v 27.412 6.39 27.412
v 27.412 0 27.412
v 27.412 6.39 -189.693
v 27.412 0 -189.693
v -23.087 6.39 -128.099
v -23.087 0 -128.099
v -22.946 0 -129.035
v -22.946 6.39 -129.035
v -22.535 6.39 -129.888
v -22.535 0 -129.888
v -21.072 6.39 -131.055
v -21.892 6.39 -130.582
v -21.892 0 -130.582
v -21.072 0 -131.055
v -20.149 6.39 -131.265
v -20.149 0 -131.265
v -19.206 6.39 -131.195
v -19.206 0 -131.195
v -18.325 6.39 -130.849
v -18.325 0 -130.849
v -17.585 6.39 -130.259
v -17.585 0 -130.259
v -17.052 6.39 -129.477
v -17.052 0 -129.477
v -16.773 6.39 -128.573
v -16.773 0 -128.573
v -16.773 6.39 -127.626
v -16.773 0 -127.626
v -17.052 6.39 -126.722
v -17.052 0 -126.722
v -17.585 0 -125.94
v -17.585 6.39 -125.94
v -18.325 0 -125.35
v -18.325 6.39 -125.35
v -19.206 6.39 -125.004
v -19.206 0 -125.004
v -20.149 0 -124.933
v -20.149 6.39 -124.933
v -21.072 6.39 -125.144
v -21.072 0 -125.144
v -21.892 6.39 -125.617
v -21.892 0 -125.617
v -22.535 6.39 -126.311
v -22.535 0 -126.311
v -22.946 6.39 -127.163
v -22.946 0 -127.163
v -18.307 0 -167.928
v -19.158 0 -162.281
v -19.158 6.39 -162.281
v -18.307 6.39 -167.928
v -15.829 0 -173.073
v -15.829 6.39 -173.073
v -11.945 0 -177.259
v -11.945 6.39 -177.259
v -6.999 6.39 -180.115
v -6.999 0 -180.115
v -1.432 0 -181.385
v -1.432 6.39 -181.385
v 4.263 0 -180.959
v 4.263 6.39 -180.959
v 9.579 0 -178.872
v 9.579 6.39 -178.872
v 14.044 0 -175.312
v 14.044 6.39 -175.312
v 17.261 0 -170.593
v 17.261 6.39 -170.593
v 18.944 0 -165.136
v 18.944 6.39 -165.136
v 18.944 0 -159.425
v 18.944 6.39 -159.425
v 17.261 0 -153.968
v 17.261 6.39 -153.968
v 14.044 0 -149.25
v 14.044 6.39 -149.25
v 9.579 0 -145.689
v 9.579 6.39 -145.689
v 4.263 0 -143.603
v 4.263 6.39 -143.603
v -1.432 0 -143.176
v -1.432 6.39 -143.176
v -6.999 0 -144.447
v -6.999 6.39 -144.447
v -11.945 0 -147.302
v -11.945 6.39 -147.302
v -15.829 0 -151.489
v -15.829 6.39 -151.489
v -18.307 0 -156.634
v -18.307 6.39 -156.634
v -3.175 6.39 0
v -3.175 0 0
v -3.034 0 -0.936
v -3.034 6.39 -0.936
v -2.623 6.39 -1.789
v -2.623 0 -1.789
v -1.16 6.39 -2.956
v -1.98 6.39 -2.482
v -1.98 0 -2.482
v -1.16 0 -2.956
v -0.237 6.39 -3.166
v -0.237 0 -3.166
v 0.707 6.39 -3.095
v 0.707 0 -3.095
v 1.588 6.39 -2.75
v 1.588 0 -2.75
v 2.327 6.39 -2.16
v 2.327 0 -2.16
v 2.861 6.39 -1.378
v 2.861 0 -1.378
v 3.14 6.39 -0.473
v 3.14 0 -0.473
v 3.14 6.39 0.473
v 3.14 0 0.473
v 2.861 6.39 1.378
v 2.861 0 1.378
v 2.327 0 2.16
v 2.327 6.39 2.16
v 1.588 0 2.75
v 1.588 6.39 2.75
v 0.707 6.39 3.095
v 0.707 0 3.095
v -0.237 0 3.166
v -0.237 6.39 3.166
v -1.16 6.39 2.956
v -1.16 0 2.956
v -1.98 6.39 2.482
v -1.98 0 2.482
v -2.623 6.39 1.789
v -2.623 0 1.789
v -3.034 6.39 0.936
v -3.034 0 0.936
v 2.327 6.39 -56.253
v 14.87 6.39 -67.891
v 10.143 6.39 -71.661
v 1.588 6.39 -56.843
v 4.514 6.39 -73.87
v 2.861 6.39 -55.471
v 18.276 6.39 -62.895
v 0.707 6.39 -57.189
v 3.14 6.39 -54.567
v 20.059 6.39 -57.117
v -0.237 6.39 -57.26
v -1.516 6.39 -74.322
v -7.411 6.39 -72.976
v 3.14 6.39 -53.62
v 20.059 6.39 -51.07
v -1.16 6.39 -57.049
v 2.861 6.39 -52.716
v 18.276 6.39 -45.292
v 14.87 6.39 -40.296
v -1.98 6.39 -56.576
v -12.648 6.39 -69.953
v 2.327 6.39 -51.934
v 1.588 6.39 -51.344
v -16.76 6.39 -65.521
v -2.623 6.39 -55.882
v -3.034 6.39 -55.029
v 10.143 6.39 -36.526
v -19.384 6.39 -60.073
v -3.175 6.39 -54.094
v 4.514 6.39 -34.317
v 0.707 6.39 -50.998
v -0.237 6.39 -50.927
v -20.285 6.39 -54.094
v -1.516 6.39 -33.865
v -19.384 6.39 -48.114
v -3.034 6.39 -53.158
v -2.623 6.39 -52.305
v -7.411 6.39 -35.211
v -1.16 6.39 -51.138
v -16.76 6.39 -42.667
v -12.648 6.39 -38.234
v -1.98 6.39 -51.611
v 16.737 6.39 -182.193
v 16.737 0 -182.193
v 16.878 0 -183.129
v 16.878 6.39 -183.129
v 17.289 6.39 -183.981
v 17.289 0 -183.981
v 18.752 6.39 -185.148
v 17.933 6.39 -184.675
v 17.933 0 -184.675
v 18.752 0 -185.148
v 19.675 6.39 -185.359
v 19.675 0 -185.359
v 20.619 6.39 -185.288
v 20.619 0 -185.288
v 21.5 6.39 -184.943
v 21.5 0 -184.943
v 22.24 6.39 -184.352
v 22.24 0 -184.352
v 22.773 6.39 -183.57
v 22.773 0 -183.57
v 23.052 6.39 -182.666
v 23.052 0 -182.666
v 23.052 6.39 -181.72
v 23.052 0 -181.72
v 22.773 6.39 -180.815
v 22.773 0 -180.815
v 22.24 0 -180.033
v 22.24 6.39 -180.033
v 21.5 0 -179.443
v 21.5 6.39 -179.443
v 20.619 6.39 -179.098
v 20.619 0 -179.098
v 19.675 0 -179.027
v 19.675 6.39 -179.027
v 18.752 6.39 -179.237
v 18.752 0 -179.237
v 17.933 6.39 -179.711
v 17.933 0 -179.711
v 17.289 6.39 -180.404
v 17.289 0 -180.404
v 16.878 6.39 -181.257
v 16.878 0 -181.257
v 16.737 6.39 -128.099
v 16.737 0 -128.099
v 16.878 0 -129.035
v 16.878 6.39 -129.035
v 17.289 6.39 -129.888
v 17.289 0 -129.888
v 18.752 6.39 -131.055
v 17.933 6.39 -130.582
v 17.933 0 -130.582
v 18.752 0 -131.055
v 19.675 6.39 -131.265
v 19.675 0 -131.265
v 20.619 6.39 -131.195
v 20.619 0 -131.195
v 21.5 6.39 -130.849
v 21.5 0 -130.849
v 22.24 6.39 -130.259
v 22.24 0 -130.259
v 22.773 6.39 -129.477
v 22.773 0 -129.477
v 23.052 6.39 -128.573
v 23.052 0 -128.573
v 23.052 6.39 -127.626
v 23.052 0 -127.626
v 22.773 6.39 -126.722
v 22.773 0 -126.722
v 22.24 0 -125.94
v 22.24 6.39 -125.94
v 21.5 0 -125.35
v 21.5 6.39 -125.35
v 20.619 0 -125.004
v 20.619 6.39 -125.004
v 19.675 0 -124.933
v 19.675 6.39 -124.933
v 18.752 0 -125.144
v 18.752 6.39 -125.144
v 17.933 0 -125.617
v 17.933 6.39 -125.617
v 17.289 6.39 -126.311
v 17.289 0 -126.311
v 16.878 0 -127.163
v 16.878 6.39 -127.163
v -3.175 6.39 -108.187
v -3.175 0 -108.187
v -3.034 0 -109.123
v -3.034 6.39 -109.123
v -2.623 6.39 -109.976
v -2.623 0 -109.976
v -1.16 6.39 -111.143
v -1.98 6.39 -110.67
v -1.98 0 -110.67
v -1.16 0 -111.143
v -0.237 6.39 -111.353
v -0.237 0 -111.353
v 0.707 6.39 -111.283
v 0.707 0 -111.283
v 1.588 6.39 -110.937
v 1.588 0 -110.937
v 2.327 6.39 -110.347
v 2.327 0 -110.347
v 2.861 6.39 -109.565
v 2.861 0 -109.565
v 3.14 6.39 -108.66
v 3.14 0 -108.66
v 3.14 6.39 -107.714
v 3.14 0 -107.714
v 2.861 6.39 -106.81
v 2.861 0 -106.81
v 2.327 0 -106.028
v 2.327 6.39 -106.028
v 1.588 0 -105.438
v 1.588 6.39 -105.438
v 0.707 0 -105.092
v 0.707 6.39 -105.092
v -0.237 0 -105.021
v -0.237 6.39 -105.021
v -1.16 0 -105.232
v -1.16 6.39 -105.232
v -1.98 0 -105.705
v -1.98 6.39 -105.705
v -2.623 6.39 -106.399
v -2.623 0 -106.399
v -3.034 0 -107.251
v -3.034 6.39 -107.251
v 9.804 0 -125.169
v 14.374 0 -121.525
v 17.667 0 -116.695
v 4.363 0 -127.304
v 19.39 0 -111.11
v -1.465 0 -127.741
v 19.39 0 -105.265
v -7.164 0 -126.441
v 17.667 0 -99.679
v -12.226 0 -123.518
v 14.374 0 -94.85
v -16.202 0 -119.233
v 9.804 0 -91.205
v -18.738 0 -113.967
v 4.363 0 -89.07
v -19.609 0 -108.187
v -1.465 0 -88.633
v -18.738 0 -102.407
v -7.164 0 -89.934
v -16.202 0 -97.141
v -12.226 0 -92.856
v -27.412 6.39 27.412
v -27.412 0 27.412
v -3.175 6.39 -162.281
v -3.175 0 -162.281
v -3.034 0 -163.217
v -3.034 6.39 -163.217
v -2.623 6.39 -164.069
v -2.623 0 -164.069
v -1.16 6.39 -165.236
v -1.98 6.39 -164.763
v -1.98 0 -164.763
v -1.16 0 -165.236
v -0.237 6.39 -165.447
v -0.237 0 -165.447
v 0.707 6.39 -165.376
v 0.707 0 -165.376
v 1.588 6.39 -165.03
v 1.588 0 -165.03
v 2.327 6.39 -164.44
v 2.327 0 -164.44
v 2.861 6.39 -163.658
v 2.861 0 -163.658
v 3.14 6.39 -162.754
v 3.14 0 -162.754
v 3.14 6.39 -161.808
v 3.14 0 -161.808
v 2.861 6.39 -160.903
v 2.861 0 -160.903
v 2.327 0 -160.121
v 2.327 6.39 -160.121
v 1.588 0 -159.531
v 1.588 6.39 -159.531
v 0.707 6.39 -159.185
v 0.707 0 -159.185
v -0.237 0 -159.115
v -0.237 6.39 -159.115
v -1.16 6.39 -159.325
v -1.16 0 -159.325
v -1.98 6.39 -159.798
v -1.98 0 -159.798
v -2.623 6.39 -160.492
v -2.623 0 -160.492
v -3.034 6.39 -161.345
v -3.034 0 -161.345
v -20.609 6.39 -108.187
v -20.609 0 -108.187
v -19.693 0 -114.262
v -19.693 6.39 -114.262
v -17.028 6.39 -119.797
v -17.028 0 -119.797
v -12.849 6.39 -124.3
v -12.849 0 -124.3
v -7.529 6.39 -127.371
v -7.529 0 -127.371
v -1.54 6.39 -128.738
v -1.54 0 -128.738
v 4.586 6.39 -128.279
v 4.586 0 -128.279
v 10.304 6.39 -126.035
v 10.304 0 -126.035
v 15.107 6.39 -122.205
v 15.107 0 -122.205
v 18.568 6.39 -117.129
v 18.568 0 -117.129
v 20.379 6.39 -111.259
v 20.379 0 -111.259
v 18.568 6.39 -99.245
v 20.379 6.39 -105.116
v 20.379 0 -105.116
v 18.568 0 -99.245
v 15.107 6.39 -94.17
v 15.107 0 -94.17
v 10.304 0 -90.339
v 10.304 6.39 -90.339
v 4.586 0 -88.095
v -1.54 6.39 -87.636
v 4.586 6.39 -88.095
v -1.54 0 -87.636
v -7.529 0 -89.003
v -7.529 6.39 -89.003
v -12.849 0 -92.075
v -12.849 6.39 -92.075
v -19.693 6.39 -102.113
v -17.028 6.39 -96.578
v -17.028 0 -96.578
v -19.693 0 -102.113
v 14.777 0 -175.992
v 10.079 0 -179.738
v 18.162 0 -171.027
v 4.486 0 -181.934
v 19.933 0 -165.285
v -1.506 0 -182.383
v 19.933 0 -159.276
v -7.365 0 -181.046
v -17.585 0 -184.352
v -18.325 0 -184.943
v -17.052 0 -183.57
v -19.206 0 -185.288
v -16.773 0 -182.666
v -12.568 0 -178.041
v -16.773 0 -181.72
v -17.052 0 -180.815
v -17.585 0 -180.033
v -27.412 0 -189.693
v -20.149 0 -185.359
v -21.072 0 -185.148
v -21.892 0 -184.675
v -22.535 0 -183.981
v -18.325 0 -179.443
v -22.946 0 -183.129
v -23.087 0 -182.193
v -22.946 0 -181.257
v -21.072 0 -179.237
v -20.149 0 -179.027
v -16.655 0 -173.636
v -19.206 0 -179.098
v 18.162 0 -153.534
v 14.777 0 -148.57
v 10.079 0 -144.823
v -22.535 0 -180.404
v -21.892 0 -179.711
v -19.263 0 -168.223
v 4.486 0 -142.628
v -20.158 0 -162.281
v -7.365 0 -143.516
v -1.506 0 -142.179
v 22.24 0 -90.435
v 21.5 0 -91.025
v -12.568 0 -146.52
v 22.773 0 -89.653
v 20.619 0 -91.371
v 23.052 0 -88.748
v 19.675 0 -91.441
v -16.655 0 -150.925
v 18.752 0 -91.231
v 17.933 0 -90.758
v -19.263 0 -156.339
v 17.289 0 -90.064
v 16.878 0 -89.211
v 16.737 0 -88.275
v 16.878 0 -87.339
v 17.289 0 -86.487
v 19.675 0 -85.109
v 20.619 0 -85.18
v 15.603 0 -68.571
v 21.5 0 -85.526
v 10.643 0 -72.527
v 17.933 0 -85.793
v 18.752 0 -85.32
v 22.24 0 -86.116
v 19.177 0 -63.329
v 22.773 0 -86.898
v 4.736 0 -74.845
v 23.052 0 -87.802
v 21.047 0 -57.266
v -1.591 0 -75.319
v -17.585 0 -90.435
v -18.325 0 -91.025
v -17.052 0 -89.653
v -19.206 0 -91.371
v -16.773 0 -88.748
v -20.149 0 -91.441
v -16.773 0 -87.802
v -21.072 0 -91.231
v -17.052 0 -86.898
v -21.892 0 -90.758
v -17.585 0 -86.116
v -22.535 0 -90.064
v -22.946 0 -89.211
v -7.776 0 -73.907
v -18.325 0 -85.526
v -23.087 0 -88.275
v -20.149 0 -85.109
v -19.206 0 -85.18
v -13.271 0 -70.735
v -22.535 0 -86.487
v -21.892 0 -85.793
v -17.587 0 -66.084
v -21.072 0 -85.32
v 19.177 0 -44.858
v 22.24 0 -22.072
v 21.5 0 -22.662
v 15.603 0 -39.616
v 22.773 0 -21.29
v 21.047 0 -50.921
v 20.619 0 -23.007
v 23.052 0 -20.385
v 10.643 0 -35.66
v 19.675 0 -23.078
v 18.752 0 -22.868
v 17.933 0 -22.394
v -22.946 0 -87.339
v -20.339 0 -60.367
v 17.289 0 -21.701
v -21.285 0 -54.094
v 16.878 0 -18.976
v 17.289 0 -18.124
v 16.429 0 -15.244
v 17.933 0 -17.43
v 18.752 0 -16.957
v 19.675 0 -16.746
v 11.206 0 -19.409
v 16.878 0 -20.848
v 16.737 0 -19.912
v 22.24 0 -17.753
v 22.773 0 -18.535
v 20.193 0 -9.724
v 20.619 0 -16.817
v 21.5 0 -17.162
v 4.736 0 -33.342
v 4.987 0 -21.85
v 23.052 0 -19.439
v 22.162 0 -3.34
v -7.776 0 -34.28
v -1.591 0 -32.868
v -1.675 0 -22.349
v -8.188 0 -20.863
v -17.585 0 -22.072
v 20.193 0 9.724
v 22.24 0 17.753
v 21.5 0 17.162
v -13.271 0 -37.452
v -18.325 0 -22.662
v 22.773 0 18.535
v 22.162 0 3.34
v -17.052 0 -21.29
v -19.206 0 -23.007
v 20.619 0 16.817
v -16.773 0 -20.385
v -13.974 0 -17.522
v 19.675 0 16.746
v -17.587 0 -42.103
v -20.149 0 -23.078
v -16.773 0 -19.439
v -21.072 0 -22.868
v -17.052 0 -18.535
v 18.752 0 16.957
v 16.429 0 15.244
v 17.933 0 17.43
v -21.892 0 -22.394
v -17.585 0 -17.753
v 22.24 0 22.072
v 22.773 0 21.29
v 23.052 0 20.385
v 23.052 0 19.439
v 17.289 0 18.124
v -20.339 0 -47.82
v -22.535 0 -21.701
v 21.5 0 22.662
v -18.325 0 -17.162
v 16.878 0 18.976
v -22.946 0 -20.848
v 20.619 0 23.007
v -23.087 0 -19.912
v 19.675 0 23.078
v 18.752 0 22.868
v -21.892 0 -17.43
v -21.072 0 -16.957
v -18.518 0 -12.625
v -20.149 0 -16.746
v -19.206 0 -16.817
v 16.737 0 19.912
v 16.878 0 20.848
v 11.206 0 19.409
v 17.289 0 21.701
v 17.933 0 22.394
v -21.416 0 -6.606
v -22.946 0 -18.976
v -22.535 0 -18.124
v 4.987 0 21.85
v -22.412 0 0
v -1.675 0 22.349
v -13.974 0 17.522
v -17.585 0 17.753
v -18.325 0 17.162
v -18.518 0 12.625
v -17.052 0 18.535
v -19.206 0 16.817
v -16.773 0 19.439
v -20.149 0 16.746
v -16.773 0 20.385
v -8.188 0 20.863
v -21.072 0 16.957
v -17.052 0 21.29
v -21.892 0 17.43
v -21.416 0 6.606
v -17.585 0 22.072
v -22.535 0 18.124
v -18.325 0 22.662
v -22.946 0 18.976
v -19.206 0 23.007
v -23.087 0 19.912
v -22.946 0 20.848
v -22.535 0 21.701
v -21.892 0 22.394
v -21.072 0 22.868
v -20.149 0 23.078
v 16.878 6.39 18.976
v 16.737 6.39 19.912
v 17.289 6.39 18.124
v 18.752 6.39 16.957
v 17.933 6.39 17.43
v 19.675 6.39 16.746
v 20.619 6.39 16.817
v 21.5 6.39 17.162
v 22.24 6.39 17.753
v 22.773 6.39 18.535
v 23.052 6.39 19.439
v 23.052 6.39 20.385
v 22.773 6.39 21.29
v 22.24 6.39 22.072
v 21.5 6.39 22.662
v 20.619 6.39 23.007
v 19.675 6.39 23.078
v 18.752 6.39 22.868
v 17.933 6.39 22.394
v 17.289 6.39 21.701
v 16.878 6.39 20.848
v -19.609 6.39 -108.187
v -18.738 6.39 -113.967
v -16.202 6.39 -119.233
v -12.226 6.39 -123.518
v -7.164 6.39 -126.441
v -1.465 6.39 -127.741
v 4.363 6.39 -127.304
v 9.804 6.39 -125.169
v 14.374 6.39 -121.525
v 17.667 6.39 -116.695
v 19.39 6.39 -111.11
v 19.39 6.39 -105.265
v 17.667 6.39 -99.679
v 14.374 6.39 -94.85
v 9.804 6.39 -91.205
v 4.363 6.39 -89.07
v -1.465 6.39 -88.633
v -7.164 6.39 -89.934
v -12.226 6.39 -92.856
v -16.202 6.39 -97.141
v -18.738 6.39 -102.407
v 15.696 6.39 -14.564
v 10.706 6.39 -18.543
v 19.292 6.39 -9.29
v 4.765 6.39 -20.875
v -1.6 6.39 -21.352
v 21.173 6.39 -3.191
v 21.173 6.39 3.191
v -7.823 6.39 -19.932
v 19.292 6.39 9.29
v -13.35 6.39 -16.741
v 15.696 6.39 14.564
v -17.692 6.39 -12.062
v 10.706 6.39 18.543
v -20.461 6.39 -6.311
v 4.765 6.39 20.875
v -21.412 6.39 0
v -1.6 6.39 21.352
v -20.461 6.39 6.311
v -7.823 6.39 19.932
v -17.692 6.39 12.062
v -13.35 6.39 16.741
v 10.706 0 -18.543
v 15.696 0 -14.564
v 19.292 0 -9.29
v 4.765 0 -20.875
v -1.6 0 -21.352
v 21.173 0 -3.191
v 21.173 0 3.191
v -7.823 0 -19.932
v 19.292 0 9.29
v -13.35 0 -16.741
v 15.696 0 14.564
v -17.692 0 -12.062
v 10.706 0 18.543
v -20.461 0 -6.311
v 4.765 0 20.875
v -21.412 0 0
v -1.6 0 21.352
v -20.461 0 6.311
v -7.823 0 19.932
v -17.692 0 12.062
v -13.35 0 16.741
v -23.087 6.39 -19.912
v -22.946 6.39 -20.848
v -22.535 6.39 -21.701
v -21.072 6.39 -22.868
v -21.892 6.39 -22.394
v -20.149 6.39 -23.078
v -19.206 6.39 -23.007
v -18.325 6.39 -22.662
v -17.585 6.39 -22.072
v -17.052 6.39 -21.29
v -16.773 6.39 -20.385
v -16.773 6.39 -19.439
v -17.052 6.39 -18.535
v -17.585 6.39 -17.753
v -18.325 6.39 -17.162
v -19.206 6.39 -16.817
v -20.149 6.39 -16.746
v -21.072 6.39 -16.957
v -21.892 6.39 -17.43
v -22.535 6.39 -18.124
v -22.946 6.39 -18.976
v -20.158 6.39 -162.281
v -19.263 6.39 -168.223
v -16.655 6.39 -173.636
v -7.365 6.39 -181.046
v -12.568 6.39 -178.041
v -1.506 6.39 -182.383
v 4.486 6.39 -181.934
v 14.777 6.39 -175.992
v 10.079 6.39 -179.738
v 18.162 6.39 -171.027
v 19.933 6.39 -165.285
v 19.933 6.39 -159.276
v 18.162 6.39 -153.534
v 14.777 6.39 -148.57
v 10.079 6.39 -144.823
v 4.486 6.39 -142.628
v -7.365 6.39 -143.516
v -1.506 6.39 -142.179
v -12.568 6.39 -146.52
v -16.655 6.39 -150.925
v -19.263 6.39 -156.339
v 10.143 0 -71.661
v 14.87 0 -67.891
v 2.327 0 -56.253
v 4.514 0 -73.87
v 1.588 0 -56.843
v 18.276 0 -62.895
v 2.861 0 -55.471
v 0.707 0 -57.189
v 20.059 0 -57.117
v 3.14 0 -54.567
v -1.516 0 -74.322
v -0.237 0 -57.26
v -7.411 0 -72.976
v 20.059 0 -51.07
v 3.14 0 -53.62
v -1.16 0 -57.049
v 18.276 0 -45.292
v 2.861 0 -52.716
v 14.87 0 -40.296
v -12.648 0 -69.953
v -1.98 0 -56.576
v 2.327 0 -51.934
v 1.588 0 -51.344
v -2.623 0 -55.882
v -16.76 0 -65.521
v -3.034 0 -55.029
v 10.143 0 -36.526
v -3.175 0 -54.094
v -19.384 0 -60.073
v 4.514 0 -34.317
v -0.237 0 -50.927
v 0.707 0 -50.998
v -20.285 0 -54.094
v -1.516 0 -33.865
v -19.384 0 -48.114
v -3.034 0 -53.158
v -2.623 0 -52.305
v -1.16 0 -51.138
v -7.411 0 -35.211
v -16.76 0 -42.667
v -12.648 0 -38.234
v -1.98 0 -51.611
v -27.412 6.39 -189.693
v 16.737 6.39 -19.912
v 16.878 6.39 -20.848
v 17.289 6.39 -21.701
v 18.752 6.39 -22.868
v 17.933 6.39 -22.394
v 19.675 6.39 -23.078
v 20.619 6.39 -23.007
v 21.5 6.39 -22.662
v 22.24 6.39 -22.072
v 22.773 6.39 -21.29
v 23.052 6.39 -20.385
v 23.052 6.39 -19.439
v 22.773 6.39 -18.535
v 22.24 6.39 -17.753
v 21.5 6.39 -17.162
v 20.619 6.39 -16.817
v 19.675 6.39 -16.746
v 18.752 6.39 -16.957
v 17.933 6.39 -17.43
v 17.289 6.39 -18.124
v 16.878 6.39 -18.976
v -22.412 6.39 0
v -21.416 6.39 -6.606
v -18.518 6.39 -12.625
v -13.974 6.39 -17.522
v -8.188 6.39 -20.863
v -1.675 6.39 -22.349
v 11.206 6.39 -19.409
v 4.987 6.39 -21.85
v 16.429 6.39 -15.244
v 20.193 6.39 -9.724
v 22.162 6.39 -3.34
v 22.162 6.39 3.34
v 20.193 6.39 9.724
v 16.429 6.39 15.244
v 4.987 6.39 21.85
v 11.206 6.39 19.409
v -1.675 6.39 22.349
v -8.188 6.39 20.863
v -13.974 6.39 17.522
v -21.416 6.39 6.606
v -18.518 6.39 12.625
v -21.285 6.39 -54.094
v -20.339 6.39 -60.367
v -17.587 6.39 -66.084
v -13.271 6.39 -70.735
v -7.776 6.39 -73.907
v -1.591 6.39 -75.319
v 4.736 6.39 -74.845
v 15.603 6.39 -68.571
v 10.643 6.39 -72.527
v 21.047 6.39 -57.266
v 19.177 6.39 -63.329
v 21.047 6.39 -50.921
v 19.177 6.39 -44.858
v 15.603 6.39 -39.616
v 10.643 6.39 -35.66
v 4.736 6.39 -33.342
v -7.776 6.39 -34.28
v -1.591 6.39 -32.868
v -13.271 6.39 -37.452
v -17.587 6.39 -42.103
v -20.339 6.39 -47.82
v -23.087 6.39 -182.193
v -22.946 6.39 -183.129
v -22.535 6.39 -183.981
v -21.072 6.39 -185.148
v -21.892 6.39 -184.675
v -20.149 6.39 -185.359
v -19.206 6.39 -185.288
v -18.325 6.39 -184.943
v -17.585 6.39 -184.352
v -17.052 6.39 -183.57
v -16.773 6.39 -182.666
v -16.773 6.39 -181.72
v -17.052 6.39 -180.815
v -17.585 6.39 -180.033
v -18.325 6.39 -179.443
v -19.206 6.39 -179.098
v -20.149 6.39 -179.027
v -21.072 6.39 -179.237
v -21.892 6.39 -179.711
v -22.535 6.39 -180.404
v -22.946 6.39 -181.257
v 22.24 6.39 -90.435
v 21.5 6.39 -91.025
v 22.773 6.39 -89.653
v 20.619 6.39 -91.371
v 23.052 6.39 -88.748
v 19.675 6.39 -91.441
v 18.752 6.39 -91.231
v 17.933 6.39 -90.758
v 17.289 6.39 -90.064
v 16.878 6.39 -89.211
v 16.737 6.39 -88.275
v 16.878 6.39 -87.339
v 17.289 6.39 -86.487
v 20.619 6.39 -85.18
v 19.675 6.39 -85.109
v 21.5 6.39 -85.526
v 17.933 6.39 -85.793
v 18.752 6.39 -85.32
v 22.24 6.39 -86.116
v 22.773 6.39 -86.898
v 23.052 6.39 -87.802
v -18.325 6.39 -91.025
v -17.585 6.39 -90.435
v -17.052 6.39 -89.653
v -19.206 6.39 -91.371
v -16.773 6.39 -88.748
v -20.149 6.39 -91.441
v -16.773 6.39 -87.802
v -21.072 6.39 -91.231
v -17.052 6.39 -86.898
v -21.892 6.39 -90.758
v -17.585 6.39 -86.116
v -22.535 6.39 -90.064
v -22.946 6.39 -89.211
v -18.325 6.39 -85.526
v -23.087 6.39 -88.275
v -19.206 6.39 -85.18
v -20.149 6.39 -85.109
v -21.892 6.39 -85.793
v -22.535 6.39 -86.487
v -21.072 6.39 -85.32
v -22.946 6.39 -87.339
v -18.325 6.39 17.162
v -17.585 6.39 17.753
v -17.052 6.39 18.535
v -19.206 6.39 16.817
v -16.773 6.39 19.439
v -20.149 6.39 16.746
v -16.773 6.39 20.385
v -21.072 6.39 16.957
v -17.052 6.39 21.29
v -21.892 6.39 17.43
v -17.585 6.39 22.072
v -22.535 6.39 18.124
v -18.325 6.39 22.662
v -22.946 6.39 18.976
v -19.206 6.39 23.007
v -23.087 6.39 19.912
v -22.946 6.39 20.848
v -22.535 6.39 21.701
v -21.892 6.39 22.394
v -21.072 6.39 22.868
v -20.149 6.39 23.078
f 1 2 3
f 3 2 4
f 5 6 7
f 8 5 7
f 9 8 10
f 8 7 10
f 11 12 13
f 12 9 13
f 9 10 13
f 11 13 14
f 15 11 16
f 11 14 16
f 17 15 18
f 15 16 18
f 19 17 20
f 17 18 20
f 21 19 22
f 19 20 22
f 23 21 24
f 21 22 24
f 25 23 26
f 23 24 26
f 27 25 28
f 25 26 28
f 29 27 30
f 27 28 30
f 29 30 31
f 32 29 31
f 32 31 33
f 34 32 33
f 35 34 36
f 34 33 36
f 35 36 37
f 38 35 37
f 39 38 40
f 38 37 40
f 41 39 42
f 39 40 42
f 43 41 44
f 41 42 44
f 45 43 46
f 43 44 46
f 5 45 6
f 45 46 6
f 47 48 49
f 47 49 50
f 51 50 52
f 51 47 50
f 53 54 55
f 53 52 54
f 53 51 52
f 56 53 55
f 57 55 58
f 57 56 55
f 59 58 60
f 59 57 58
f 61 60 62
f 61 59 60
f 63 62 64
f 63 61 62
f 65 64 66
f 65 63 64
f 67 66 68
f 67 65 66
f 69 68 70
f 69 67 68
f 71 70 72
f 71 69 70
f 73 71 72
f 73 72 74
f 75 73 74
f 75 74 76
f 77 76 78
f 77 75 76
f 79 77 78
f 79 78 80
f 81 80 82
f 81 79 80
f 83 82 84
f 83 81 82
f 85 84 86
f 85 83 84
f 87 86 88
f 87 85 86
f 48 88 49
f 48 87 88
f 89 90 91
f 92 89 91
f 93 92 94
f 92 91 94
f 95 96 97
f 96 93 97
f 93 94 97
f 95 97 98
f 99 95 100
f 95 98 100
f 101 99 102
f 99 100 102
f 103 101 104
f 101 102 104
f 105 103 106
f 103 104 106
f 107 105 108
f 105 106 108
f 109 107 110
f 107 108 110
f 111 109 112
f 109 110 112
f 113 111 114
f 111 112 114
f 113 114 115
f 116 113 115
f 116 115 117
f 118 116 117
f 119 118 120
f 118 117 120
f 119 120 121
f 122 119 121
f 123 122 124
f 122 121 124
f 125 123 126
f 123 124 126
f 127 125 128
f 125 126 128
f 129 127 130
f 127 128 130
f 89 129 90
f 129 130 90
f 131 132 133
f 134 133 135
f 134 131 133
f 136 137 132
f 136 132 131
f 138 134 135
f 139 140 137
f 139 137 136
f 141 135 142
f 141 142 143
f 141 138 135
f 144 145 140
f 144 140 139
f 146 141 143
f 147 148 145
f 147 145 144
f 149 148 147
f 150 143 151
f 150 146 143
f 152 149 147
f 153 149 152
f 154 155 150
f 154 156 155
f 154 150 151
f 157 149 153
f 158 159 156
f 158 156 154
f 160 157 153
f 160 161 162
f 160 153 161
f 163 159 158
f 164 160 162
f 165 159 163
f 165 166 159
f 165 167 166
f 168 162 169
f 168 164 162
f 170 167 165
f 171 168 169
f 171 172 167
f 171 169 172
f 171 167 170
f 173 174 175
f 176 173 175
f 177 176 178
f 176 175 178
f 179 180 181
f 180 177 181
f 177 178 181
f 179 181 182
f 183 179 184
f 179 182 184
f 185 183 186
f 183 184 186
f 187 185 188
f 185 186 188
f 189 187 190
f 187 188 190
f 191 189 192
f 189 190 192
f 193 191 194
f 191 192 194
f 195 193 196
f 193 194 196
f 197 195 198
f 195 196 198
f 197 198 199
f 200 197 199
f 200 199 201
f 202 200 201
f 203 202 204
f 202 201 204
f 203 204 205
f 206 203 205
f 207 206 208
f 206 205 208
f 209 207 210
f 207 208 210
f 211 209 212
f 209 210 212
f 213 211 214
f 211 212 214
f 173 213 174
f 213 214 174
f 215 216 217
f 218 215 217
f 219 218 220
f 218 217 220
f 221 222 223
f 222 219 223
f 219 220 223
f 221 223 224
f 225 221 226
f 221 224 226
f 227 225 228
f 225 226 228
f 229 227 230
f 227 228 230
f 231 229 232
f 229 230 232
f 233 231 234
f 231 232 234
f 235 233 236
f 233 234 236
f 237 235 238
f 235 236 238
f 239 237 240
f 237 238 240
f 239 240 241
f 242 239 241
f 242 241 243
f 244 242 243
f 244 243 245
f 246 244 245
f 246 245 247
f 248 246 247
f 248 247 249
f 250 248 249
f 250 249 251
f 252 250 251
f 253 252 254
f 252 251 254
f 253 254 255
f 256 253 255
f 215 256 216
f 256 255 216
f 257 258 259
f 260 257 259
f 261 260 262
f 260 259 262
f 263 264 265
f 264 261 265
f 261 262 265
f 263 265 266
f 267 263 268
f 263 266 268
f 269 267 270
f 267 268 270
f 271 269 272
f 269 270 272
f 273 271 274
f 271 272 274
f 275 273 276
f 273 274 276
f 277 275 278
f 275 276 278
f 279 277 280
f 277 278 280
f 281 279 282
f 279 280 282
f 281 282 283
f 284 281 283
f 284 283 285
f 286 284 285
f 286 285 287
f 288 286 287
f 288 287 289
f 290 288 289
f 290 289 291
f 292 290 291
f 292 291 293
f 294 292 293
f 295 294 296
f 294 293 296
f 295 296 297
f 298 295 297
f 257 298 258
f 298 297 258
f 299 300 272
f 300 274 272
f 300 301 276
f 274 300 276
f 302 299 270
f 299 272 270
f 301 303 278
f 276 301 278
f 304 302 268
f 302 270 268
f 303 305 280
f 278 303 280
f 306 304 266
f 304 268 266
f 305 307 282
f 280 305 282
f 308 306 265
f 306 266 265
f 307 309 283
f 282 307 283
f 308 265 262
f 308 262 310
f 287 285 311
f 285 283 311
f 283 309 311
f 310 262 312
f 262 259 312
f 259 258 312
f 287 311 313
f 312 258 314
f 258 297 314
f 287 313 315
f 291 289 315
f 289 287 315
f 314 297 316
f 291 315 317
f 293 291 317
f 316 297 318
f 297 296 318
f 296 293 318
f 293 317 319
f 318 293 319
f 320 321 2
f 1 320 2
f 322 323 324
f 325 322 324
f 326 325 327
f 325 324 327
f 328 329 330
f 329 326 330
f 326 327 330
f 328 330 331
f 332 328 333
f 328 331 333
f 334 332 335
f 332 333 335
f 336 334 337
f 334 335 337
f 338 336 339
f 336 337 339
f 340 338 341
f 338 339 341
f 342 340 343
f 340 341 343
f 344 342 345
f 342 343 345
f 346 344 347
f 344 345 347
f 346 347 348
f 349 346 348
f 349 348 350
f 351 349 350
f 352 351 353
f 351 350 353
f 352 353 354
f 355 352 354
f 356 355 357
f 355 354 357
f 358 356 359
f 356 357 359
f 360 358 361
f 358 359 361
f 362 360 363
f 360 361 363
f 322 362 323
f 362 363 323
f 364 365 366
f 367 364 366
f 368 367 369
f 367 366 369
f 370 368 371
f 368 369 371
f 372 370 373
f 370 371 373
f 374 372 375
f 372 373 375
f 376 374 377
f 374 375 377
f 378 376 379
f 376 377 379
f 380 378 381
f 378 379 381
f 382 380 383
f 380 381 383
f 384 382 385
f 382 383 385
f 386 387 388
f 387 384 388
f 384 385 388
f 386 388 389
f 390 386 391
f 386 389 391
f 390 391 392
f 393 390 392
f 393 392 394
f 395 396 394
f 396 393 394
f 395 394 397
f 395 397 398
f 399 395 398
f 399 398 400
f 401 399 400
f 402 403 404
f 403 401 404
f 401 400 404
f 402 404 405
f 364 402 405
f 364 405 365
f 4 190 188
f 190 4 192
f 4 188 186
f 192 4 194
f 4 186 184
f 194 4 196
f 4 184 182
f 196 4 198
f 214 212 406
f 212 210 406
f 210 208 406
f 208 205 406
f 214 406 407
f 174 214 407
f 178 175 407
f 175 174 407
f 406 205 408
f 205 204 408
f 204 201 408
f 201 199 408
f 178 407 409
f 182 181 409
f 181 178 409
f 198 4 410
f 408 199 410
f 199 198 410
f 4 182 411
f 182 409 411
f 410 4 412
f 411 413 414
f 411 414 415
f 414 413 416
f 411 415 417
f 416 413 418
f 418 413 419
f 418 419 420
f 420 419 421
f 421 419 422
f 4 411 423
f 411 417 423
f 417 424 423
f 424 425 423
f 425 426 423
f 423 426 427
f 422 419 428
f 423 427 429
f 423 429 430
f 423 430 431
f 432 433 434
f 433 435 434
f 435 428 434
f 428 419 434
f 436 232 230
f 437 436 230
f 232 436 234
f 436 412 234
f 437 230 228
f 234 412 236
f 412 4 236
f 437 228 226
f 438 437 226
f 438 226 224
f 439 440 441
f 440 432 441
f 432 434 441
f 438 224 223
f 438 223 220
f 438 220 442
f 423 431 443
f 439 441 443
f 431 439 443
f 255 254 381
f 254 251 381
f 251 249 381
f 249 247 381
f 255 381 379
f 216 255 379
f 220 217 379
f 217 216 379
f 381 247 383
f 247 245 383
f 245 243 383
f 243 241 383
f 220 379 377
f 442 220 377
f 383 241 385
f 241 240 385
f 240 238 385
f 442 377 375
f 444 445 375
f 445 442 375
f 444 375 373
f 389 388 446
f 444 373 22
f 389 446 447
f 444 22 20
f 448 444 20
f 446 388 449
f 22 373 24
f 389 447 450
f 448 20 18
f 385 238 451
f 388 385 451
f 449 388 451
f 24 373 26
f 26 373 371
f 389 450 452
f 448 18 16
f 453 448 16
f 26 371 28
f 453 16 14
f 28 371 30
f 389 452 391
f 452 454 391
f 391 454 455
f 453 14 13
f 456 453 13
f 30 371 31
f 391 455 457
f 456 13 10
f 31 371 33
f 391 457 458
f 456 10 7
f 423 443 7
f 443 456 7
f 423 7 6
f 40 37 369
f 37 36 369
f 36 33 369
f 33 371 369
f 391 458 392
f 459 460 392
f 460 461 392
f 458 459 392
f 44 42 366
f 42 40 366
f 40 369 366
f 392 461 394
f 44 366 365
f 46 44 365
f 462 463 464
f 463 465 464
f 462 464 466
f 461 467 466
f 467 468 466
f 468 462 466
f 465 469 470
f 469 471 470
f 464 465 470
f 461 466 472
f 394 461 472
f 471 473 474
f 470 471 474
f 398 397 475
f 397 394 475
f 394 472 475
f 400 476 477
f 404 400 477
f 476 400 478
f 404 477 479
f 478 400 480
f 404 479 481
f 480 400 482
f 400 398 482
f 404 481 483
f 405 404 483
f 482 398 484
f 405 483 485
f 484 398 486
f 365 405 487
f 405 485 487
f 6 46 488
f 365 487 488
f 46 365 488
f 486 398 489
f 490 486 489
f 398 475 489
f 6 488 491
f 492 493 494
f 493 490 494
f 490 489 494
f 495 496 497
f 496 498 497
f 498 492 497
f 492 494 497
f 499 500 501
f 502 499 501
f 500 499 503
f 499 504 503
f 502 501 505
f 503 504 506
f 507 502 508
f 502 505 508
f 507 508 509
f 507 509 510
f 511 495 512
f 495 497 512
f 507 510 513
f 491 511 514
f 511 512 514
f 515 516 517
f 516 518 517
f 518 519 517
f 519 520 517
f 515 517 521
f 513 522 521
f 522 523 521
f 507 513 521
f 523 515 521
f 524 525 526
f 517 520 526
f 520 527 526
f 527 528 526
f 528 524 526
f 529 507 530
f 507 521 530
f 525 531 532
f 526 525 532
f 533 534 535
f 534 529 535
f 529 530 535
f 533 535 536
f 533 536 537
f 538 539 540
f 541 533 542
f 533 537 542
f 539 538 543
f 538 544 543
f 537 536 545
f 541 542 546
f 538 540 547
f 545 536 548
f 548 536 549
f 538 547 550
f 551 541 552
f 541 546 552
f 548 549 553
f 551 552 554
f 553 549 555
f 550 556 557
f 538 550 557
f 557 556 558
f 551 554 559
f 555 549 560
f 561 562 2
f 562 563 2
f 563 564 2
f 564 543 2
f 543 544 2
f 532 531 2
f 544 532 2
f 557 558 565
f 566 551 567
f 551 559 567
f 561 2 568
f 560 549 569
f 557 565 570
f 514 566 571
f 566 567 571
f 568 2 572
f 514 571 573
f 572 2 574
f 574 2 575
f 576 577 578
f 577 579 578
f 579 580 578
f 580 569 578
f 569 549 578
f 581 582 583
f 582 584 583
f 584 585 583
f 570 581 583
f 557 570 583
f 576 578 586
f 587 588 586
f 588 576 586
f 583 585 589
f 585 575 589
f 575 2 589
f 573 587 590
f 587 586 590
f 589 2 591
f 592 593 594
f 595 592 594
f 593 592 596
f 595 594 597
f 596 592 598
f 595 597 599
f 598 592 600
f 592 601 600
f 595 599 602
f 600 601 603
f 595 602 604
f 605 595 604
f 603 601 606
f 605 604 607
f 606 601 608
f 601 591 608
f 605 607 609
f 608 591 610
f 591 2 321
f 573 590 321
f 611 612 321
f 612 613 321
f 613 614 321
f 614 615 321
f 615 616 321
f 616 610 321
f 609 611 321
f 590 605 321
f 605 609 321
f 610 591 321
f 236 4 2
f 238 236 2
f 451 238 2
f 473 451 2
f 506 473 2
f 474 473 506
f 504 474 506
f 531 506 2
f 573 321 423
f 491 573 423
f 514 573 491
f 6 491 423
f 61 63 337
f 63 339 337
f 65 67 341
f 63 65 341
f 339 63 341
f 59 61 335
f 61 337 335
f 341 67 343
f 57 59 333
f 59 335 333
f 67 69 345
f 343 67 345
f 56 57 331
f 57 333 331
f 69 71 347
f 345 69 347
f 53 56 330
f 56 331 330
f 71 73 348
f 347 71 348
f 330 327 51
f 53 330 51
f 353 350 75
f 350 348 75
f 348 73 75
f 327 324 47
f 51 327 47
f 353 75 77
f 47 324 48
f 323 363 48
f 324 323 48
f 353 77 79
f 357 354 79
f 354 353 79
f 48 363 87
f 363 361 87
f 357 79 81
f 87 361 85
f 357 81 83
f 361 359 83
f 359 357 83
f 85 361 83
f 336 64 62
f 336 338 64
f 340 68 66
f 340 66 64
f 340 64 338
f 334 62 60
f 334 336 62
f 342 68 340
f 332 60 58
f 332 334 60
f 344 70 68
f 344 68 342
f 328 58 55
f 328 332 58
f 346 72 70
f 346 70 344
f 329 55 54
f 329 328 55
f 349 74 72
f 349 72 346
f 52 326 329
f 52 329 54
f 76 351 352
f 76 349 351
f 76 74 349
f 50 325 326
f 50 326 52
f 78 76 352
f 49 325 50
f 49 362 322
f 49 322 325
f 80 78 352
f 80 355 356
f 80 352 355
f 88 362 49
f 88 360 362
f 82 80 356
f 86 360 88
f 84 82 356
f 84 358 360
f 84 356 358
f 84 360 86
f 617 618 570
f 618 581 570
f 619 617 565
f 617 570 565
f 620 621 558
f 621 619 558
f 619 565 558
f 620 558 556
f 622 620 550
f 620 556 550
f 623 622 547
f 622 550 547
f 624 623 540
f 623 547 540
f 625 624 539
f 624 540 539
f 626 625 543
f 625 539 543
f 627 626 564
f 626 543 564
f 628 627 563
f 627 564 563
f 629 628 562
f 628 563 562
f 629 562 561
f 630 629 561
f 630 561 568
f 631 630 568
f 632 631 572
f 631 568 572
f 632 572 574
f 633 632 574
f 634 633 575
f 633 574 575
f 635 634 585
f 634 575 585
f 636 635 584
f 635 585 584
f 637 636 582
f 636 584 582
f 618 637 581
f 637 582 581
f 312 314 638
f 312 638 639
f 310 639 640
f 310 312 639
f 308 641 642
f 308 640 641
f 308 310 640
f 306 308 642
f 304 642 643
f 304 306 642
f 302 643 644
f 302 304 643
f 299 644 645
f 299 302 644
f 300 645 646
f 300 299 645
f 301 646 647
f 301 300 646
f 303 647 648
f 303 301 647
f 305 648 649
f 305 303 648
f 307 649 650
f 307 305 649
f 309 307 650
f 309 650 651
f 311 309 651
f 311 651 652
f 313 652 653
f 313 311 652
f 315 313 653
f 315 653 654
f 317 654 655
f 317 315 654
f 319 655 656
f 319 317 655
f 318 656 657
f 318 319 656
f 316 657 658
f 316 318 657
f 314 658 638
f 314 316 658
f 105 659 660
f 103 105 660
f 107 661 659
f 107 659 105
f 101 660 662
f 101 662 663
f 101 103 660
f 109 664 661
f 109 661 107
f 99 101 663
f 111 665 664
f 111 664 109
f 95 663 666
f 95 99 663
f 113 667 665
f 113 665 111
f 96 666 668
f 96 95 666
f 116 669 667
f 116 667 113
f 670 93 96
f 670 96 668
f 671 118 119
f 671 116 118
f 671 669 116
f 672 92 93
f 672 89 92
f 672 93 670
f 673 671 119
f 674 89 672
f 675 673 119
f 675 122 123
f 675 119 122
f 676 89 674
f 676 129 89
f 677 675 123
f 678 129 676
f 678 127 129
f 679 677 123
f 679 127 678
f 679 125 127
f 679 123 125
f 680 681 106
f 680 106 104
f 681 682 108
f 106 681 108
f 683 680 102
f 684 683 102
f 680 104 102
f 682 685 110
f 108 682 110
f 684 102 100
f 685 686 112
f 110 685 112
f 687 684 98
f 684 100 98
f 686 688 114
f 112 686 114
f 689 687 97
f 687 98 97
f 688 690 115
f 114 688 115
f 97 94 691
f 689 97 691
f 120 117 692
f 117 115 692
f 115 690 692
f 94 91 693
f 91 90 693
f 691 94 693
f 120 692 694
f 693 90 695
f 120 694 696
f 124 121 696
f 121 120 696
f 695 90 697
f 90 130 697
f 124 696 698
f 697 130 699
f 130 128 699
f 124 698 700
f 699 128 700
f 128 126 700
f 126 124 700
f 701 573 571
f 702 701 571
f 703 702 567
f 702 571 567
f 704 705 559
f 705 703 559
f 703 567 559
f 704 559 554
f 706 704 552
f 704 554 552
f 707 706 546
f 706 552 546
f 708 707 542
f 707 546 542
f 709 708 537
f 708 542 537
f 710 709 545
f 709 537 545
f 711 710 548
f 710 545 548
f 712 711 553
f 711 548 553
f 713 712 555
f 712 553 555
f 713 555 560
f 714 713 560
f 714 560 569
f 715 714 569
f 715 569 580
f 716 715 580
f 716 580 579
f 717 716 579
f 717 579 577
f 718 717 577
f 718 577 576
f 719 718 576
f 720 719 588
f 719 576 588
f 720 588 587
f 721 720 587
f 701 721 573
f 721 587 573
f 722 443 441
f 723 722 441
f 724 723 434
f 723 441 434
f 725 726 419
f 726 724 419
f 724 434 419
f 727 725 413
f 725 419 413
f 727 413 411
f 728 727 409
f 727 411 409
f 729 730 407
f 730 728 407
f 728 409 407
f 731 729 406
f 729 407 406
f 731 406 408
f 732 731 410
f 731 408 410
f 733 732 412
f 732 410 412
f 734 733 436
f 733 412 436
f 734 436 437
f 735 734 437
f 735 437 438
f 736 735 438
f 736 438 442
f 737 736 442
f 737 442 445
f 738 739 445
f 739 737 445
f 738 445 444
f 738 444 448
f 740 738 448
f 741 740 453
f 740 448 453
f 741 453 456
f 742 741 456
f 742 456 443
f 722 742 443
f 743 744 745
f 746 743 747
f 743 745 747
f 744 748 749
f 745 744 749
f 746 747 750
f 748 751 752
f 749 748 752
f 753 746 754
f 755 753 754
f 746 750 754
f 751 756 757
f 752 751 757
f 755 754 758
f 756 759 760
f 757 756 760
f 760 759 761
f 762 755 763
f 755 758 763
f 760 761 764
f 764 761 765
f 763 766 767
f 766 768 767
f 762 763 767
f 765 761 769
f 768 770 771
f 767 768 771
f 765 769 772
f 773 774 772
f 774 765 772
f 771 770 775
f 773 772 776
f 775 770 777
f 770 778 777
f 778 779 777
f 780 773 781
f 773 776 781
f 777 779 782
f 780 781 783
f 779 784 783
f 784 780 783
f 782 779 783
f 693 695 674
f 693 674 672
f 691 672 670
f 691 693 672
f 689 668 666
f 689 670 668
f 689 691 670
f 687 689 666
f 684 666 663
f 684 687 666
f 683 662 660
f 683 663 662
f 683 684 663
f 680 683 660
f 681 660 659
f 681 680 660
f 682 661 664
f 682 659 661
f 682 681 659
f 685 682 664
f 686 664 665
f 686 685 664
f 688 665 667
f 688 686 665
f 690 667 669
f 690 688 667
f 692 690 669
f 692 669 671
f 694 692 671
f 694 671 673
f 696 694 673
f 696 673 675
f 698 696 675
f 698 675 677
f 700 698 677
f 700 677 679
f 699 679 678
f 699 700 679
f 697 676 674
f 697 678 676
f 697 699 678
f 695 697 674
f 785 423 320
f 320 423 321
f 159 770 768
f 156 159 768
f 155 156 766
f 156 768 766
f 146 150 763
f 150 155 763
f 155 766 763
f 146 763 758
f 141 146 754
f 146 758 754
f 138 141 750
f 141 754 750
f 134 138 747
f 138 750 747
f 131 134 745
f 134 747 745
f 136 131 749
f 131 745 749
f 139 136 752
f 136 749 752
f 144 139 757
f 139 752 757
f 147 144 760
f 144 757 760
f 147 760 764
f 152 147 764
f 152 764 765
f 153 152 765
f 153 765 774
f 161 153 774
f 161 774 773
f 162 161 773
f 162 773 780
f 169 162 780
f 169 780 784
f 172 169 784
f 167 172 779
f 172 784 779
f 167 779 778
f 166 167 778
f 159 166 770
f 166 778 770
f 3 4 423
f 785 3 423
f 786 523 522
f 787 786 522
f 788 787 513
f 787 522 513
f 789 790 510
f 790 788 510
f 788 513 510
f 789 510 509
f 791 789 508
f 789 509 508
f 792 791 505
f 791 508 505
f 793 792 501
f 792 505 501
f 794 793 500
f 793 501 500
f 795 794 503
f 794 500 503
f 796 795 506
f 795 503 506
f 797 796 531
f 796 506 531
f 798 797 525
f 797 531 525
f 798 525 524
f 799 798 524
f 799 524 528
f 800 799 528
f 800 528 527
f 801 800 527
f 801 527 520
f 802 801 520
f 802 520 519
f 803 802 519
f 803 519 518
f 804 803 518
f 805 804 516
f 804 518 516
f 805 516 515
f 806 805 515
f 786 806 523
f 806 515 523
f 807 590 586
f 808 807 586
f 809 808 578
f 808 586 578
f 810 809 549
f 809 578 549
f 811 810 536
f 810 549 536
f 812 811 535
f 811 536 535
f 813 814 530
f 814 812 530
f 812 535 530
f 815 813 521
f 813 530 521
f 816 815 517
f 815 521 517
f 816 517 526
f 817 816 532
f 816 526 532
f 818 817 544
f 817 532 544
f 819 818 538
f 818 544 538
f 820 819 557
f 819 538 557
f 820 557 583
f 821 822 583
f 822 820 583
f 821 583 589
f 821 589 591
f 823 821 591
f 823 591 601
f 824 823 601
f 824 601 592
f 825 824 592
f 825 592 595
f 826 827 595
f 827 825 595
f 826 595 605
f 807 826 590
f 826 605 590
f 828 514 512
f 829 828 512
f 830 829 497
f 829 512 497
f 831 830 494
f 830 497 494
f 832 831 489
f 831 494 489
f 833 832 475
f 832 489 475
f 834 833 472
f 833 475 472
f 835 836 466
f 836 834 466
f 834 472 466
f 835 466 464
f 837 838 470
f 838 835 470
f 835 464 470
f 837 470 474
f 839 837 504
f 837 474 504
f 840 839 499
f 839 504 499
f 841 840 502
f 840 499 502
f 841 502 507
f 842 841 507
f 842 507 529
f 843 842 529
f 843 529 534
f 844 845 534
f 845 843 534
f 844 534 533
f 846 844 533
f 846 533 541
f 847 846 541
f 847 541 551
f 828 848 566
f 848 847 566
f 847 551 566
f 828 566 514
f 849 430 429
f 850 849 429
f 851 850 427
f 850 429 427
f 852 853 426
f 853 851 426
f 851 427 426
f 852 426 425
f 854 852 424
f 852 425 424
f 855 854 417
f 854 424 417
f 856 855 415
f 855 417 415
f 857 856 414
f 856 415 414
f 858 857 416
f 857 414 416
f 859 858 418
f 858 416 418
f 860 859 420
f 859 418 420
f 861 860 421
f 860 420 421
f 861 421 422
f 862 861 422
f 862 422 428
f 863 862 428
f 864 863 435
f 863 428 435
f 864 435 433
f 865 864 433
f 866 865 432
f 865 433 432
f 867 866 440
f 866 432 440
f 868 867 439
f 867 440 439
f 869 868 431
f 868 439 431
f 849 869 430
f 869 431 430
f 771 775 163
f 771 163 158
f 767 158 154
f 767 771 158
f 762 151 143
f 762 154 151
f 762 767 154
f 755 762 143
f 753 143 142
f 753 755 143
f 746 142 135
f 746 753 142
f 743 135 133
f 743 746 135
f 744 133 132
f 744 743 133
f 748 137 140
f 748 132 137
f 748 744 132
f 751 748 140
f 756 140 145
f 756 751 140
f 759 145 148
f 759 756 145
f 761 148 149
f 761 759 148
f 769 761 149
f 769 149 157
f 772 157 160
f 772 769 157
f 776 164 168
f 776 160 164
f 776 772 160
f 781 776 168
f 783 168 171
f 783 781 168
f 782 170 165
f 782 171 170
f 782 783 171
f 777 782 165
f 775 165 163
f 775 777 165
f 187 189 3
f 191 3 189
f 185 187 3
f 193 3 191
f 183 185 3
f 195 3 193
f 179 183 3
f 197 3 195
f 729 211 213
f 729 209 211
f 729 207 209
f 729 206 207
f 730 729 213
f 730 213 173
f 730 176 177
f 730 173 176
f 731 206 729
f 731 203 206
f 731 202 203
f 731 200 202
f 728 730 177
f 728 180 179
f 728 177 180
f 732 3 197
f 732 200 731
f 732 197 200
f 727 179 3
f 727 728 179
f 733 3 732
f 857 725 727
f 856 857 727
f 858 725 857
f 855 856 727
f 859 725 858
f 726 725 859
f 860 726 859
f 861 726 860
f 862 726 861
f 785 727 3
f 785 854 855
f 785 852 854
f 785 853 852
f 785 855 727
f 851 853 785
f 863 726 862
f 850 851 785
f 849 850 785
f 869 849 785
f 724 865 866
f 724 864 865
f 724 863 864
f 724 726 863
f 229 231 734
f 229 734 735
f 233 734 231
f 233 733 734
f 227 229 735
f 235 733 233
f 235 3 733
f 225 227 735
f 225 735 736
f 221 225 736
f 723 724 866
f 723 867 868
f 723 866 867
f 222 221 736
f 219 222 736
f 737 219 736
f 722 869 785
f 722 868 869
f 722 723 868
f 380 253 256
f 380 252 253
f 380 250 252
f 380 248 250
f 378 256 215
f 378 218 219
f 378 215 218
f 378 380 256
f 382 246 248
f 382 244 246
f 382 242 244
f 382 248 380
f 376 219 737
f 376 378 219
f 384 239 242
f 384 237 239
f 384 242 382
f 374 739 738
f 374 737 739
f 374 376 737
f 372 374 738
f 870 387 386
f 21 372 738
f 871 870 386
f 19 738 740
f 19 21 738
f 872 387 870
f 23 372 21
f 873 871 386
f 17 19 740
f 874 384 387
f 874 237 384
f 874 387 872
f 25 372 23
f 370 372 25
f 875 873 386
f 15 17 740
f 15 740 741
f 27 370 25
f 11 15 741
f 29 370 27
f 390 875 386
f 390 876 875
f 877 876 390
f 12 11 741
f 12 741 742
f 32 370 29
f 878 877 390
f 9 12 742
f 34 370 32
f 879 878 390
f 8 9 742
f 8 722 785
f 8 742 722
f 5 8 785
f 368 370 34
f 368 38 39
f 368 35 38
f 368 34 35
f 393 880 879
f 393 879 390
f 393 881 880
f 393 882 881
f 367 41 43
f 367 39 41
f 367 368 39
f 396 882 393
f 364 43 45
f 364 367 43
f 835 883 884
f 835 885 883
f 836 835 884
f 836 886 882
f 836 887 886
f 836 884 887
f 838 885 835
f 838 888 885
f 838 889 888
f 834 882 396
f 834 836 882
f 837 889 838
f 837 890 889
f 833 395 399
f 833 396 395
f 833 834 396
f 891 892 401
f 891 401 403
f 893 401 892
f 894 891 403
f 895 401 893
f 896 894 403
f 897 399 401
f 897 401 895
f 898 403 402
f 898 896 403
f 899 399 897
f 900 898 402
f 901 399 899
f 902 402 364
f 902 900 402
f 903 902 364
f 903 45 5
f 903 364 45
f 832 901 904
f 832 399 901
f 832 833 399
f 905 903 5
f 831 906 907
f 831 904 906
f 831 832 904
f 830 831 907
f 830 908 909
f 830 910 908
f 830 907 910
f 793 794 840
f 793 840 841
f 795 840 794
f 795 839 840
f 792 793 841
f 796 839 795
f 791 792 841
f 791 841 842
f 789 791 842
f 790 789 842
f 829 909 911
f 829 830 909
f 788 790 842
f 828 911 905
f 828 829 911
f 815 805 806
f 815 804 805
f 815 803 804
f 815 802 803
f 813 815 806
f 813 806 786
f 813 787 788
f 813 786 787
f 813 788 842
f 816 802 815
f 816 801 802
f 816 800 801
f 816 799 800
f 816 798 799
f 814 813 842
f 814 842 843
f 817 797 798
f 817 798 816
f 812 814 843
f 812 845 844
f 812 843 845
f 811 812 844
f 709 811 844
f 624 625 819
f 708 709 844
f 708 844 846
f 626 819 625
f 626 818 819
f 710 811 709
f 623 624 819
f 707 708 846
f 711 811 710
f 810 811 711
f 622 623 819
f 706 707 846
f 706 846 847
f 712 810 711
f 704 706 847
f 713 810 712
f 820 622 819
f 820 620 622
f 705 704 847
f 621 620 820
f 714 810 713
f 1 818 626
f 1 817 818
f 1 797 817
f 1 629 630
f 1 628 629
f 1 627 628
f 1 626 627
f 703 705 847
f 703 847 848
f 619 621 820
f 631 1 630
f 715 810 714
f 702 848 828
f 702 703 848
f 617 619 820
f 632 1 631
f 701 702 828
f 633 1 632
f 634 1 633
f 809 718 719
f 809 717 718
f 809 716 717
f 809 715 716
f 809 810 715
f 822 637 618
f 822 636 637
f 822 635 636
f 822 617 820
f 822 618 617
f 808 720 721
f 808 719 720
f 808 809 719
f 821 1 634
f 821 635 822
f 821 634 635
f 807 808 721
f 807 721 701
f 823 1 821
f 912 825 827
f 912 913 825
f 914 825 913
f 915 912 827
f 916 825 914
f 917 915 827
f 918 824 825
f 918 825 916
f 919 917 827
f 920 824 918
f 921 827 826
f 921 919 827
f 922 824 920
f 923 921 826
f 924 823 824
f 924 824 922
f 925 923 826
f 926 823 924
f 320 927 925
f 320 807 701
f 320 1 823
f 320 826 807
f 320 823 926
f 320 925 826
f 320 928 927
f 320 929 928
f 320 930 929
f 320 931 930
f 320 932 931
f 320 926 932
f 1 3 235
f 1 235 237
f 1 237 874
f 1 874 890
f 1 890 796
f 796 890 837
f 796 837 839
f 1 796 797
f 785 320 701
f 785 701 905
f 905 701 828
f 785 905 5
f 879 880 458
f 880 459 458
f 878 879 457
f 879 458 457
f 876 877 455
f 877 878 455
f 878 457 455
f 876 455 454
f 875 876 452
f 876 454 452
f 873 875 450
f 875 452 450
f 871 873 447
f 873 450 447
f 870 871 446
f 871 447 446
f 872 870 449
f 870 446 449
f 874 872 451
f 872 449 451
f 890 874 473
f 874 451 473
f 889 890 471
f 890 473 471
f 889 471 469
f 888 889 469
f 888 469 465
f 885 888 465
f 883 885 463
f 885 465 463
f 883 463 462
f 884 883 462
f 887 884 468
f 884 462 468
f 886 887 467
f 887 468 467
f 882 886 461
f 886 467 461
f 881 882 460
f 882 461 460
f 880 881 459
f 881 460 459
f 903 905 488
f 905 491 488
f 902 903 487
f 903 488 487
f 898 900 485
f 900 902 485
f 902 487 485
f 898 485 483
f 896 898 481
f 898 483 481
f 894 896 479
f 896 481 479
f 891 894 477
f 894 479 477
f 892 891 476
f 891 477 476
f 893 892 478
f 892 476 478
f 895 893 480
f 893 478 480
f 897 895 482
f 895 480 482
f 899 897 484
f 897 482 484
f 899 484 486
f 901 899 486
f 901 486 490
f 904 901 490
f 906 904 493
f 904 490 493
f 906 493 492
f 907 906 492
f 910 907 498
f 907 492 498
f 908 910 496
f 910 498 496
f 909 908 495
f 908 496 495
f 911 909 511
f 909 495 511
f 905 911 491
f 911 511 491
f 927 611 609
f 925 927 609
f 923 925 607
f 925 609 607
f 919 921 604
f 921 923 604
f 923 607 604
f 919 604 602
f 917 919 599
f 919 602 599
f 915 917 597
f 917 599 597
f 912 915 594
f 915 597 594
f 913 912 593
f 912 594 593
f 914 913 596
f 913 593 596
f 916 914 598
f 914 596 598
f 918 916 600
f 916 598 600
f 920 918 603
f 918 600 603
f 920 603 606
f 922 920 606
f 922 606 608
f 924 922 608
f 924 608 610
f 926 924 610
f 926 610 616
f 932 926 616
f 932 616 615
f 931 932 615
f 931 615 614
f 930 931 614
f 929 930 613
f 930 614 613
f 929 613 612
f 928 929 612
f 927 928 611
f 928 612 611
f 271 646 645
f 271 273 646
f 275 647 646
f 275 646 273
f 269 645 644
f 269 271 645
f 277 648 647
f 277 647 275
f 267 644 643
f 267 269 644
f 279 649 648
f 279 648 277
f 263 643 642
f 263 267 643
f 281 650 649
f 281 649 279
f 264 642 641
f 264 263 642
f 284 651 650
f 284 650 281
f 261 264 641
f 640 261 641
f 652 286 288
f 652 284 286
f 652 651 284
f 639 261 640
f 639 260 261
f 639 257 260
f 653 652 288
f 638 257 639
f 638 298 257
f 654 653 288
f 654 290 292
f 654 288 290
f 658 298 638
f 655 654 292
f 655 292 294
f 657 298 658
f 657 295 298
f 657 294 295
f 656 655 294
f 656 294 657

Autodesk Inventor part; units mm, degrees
ref_plane "YZ Plane" through (0, 0, 0) normal (1, 0, 0) x (0, 1, 0)
ref_plane "XZ Plane" through (0, 0, 0) normal (0, 1, 0) x (-1, 0, 0)
ref_plane "XY Plane" through (0, 0, 0) normal (0, 0, 1) x (1, 0, 0)
sketch "Sketch1" plane through (0, 0, 0) normal (0, 1, 0) x (-1, 0, 0)
  circle A0 centre (0, 0) radius 21.4121
  circle A1 centre (0, 0) radius 16.9043 construction
  circle A2 centre (0, 0) radius 3.175
  circle A3 centre (0, 0) radius 22.4121
  circle A4 centre (0, -54.0936) radius 3.175
  circle A5 centre (0, -108.1872) radius 3.175
  circle A6 centre (0, -162.2808) radius 3.175
  circle A7 centre (0, -54.0936) radius 20.2851
  circle A8 centre (0, -54.0936) radius 21.2851
  circle A9 centre (0, -108.1872) radius 19.6089
  circle A10 centre (0, -108.1872) radius 20.6089
  circle A11 centre (0, -162.2808) radius 19.1582
  circle A12 centre (0, -162.2808) radius 20.1582
  line L0 (27.4121, 27.4121) -> (-27.4121, 27.4121)
  line L1 (-27.4121, 27.4121) -> (-27.4121, -189.6929)
  line L2 (-27.4121, -189.6929) -> (27.4121, -189.6929)
  line L3 (27.4121, -189.6929) -> (27.4121, 27.4121)
  circle A13 centre (-19.9121, 19.9121) radius 3.175
  circle A14 centre (19.9121, 19.9121) radius 3.175
  line L4 (0, 0) -> (-27.4121, 0) construction
  circle A15 centre (-19.9121, -19.9121) radius 3.175
  circle A16 centre (19.9121, -19.9121) radius 3.175
  line L5 (0, -54.0936) -> (-27.4121, -54.0936) construction
  circle A17 centre (19.9121, -88.2752) radius 3.175
  circle A18 centre (-19.9121, -88.2752) radius 3.175
  line L6 (0, -108.1872) -> (-27.4121, -108.1872) construction
  circle A19 centre (19.9121, -128.0993) radius 3.175
  circle A20 centre (-19.9121, -128.0993) radius 3.175
  line L7 (0, -162.2808) -> (-27.4121, -162.2808) construction
  circle A21 centre (19.9121, -182.1929) radius 3.175
  line L8 (0, -162.2808) -> (0, -189.6929) construction
  circle A22 centre (-19.9121, -182.1929) radius 3.175
  dimension "d1" = 42.8241
  dimension "d2" = 33.8085
  dimension "d4" = 6.35
  dimension "d11" = 44.8241
  dimension "d12" = 6.35
  dimension "d13" = 6.35
  dimension "d14" = 6.35
  dimension "d15" = 54.0936
  dimension "d16" = 54.0936
  dimension "d17" = 54.0936
  dimension "d18" = 40.5702
  dimension "d19" = 42.5702
  dimension "d20" = 39.2179
  dimension "d21" = 41.2179
  dimension "d22" = 38.3163
  dimension "d23" = 40.3163
  dimension "d31" = 27.4121
  dimension "d32" = 27.4121
  dimension "d33" = 27.4121
  dimension "d34" = 27.4121
  dimension "d37" = 6.35
  dimension "d38" = 7.5
  dimension "d39" = 7.5
  dimension "d40" = 6.35
  dimension "d41" = 7.5
  dimension "d50" = 6.35
  dimension "d51" = 7.5
extrude "Extrusion3" add sketch "Sketch1" along normal blind 6.39
equation "\"d1\" = 0.95 * d0"
equation "\"d2\" = 0.75 * d0"
equation "\"d12\" = d4"
equation "\"d13\" = d4"
equation "\"d14\" = d4"
equation "\"d15\" = 1.2 * d0"
equation "\"d16\" = d15"
equation "\"d17\" = d15"
equation "\"d18\" = 0.9 * d0"
equation "\"d20\" = 0.87 * d0"
equation "\"d22\" = 0.85 * d0"
equation "\"d32\" = d31"
equation "\"d33\" = d31"
equation "\"d34\" = d31"
equation "\"d52\" = WoodThickness"
equation "\"d0\" = 45.078"
equation "\"WoodThickness\" = 6.39"
properties part number "CouplingHeadSilicone_Cavity"
